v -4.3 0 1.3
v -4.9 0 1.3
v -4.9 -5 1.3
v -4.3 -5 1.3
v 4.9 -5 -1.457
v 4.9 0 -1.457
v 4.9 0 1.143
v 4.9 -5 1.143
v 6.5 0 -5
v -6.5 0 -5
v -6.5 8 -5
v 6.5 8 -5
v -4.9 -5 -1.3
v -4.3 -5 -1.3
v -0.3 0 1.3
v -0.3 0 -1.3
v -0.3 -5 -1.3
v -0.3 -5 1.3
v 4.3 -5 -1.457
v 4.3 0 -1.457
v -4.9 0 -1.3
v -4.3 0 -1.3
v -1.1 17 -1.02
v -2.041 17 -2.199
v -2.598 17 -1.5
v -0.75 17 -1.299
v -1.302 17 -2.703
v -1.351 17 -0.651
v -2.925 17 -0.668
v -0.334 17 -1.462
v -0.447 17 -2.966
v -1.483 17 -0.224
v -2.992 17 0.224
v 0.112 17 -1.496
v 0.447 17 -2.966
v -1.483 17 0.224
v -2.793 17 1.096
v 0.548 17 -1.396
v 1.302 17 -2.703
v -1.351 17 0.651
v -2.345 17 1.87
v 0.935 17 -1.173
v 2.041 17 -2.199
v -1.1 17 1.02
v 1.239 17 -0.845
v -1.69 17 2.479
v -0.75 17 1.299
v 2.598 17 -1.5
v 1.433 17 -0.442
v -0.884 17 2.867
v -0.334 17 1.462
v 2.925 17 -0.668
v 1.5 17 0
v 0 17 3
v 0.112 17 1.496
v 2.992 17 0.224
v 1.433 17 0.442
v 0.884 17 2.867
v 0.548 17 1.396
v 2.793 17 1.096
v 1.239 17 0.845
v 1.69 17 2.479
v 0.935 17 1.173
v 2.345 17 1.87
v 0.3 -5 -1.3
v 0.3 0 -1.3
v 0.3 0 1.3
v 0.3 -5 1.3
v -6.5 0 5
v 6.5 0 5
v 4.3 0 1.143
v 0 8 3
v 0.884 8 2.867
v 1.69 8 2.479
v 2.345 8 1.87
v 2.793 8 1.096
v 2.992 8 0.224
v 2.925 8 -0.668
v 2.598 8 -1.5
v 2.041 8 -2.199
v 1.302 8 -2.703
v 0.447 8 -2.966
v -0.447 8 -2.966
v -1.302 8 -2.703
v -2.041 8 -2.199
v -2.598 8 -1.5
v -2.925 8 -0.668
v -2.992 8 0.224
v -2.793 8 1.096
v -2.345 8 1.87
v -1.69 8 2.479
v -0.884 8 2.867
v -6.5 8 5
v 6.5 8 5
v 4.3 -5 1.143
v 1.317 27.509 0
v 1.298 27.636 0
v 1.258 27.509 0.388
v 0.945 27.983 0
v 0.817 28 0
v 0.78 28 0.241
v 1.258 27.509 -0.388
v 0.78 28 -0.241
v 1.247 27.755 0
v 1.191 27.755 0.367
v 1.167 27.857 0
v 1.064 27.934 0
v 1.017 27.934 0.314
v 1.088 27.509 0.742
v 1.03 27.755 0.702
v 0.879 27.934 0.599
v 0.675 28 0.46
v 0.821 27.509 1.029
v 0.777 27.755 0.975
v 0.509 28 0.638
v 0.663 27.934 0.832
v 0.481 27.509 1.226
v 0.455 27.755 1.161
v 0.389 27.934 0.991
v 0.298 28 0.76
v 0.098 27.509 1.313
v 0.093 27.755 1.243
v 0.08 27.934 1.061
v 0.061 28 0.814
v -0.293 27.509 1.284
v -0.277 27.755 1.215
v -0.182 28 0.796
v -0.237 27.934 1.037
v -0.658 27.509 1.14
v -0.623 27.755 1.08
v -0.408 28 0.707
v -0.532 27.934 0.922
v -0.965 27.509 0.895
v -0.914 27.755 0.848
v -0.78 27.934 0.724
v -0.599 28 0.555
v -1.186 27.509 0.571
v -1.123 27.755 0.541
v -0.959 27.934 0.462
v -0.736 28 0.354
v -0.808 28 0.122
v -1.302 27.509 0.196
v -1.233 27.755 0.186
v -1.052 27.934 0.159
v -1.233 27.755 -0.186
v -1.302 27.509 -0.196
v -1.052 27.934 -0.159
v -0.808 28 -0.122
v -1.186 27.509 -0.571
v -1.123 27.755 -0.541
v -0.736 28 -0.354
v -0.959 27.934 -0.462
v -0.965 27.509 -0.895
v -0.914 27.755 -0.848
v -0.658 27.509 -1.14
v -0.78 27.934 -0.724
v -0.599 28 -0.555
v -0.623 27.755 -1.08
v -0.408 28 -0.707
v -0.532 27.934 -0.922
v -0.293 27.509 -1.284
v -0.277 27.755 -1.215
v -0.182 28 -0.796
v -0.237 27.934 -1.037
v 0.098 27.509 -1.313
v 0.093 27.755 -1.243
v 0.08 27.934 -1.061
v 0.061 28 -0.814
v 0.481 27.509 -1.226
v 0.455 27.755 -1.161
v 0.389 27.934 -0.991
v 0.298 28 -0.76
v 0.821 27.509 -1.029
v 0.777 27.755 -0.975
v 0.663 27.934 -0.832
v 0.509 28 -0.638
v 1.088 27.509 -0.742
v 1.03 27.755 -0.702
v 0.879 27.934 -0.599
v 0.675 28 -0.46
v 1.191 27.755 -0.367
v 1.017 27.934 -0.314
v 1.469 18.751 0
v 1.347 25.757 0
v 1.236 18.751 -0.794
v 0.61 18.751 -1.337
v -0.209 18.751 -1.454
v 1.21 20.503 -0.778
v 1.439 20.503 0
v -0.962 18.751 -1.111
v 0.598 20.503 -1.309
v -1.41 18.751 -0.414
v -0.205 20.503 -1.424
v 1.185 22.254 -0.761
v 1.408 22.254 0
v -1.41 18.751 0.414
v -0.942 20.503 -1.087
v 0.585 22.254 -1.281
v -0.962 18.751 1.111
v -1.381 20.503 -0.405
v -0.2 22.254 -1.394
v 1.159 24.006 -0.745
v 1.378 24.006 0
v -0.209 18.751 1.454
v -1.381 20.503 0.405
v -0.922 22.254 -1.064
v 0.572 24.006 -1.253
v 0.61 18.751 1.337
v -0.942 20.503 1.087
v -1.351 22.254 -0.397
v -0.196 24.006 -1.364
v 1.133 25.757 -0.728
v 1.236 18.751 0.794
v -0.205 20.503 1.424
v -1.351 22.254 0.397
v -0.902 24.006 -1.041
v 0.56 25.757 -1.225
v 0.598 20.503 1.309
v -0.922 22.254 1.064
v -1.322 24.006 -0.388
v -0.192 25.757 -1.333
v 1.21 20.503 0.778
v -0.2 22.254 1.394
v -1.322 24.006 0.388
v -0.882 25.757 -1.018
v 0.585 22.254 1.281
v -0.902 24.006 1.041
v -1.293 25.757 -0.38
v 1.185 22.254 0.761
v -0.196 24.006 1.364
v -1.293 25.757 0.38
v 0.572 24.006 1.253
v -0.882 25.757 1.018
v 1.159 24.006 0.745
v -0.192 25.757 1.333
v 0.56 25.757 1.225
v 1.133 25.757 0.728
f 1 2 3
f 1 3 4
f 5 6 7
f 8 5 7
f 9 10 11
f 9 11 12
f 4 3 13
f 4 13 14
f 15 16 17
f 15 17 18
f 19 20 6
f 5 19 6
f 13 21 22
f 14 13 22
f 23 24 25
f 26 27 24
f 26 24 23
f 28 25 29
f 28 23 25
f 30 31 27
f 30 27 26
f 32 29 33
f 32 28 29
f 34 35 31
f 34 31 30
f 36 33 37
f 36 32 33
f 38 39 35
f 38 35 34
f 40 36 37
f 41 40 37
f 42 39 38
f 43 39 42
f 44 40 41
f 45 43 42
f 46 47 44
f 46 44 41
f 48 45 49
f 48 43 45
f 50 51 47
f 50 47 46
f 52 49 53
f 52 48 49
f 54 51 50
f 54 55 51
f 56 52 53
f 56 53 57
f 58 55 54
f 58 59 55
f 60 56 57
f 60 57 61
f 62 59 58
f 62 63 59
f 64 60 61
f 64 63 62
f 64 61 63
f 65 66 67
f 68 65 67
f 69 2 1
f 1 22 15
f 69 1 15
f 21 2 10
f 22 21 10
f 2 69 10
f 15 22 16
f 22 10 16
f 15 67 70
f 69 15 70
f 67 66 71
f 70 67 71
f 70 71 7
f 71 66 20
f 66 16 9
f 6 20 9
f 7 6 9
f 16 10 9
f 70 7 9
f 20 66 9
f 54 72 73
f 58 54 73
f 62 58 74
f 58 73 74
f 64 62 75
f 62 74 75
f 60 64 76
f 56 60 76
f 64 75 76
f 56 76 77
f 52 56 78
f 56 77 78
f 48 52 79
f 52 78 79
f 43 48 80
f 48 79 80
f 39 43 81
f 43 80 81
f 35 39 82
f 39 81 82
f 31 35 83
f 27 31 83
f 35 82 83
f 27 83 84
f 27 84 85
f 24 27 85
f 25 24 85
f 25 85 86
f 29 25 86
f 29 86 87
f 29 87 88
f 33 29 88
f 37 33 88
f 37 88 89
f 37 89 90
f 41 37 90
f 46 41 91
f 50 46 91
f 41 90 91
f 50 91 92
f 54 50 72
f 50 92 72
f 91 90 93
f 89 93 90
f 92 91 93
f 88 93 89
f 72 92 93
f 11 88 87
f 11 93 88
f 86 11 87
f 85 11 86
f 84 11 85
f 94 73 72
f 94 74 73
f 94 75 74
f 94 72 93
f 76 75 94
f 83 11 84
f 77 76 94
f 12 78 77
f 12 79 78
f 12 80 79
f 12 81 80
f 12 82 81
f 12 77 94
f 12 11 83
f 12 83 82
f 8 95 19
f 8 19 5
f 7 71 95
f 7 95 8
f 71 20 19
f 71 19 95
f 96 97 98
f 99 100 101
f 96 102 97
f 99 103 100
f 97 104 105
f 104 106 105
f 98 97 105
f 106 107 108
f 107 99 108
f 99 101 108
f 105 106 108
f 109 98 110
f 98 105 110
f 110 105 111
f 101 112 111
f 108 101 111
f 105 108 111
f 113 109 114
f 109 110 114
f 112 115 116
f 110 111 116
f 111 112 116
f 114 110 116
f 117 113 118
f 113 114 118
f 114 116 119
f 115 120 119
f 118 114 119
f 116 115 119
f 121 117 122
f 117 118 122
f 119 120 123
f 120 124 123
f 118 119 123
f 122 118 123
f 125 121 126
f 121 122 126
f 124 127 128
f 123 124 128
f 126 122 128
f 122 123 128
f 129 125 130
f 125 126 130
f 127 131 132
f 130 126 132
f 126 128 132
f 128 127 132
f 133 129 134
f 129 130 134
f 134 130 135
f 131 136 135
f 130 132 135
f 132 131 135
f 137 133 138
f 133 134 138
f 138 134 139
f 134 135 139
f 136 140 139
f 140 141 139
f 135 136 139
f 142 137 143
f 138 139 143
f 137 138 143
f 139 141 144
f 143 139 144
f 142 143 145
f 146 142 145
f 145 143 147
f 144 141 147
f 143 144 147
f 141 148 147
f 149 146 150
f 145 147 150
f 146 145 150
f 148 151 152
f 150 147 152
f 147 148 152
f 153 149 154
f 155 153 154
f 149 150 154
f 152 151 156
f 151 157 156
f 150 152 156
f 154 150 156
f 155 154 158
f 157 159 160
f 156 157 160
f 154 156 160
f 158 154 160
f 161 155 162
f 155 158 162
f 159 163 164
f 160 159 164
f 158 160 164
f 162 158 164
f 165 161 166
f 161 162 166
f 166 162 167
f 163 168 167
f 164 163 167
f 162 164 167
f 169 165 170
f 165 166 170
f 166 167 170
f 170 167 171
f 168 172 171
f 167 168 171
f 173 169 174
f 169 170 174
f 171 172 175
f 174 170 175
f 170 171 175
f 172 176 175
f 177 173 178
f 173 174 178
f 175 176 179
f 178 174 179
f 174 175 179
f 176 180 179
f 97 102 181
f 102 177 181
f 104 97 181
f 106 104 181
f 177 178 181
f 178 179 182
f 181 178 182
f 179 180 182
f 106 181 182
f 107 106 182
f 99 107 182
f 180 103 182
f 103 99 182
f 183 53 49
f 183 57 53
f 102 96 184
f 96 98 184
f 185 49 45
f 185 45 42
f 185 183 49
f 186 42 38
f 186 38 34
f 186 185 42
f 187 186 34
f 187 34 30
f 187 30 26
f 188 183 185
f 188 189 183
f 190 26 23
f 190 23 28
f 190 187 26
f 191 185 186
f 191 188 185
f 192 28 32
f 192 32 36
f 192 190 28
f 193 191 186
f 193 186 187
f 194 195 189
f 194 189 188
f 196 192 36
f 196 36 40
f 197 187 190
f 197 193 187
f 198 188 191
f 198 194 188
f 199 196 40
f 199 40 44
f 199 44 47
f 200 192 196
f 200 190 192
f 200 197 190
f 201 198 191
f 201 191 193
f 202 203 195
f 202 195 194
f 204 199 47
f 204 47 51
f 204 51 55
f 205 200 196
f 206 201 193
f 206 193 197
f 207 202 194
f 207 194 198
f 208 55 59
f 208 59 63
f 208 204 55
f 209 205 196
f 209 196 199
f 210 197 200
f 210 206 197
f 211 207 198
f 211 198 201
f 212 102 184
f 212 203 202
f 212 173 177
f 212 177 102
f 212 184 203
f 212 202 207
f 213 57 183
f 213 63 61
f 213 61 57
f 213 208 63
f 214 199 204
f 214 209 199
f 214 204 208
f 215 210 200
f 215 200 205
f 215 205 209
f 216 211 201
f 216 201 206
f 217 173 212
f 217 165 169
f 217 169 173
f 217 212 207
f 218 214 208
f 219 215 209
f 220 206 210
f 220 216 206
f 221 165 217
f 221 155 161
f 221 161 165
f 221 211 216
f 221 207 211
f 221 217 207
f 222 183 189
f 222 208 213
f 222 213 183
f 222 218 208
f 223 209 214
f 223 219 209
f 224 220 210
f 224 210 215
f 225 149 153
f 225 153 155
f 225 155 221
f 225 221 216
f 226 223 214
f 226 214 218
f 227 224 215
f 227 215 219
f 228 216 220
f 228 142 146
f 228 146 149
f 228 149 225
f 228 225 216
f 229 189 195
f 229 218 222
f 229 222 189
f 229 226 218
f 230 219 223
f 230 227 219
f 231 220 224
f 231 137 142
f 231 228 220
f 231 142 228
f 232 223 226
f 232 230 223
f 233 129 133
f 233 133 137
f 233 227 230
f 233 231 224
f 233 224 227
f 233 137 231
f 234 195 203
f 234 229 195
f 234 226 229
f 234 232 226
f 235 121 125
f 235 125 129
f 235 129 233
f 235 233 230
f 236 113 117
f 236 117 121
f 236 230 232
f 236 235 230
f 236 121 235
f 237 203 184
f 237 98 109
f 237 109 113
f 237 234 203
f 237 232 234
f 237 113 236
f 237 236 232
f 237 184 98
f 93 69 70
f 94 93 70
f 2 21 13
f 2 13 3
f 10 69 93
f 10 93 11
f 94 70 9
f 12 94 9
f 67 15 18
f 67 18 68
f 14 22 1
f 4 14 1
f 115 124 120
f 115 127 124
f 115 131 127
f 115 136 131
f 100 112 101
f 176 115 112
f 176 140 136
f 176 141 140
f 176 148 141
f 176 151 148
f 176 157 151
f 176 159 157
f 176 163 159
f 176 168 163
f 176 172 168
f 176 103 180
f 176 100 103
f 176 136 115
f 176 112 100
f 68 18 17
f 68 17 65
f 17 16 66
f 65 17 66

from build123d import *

# Parameters (mm, degrees)
SKETCH_1_W      = 13
SKETCH_1_H      = 10
EXTRUDE_1_DEPTH = 8
SKETCH_2_R      = 3
EXTRUDE_2_DEPTH = 9
SKETCH_6_R      = 1.5
EXTRUDE_3_DEPTH = 11
EXTRUDE_3_TAPER = 1
FILLET_1_R      = 0.5
SKETCH_7_W      = 0.6
SKETCH_7_H      = 2.6
EXTRUDE_4_DEPTH = 5


with BuildPart() as part:
    # 草图1 → 凸台-拉伸1 (new body)
    with BuildSketch(Plane(origin=(0, 0, 0), x_dir=(1, 0, 0), z_dir=(0, 1, 0))):
        Rectangle(SKETCH_1_W, SKETCH_1_H)
    extrude(amount=EXTRUDE_1_DEPTH)

    # 草图2 → 凸台-拉伸2 (add)
    with BuildSketch(Plane(origin=(0, 8, 0), x_dir=(1, 0, 0), z_dir=(0, 1, 0))):
        with Locations(Location((0, 0, 0), (0, 0, 270))):
            Circle(SKETCH_2_R)
    extrude(amount=EXTRUDE_2_DEPTH)

    # 草图6 → 凸台-拉伸3 (add)
    with BuildSketch(Plane(origin=(0, 17, 0), x_dir=(1, 0, 0), z_dir=(0, 1, 0))):
        Circle(SKETCH_6_R)
    extrude(amount=EXTRUDE_3_DEPTH, taper=EXTRUDE_3_TAPER)

    # 圆角1
    fillet_1_edges = [part.edges().sort_by_distance(p)[0] for p in [
        (-1.307994286, 28, 0),
    ]]
    fillet(fillet_1_edges, radius=FILLET_1_R)

    # 草图7 → 凸台-拉伸4 (add)
    with BuildSketch(Plane.XZ):
        with Locations((-4.6, 0)):
            Rectangle(SKETCH_7_W, SKETCH_7_H)
        Rectangle(SKETCH_7_W, SKETCH_7_H)
        with Locations((4.6, -0.156510549)):
            Rectangle(SKETCH_7_W, SKETCH_7_H)
    extrude(amount=EXTRUDE_4_DEPTH)


solid = part.part
